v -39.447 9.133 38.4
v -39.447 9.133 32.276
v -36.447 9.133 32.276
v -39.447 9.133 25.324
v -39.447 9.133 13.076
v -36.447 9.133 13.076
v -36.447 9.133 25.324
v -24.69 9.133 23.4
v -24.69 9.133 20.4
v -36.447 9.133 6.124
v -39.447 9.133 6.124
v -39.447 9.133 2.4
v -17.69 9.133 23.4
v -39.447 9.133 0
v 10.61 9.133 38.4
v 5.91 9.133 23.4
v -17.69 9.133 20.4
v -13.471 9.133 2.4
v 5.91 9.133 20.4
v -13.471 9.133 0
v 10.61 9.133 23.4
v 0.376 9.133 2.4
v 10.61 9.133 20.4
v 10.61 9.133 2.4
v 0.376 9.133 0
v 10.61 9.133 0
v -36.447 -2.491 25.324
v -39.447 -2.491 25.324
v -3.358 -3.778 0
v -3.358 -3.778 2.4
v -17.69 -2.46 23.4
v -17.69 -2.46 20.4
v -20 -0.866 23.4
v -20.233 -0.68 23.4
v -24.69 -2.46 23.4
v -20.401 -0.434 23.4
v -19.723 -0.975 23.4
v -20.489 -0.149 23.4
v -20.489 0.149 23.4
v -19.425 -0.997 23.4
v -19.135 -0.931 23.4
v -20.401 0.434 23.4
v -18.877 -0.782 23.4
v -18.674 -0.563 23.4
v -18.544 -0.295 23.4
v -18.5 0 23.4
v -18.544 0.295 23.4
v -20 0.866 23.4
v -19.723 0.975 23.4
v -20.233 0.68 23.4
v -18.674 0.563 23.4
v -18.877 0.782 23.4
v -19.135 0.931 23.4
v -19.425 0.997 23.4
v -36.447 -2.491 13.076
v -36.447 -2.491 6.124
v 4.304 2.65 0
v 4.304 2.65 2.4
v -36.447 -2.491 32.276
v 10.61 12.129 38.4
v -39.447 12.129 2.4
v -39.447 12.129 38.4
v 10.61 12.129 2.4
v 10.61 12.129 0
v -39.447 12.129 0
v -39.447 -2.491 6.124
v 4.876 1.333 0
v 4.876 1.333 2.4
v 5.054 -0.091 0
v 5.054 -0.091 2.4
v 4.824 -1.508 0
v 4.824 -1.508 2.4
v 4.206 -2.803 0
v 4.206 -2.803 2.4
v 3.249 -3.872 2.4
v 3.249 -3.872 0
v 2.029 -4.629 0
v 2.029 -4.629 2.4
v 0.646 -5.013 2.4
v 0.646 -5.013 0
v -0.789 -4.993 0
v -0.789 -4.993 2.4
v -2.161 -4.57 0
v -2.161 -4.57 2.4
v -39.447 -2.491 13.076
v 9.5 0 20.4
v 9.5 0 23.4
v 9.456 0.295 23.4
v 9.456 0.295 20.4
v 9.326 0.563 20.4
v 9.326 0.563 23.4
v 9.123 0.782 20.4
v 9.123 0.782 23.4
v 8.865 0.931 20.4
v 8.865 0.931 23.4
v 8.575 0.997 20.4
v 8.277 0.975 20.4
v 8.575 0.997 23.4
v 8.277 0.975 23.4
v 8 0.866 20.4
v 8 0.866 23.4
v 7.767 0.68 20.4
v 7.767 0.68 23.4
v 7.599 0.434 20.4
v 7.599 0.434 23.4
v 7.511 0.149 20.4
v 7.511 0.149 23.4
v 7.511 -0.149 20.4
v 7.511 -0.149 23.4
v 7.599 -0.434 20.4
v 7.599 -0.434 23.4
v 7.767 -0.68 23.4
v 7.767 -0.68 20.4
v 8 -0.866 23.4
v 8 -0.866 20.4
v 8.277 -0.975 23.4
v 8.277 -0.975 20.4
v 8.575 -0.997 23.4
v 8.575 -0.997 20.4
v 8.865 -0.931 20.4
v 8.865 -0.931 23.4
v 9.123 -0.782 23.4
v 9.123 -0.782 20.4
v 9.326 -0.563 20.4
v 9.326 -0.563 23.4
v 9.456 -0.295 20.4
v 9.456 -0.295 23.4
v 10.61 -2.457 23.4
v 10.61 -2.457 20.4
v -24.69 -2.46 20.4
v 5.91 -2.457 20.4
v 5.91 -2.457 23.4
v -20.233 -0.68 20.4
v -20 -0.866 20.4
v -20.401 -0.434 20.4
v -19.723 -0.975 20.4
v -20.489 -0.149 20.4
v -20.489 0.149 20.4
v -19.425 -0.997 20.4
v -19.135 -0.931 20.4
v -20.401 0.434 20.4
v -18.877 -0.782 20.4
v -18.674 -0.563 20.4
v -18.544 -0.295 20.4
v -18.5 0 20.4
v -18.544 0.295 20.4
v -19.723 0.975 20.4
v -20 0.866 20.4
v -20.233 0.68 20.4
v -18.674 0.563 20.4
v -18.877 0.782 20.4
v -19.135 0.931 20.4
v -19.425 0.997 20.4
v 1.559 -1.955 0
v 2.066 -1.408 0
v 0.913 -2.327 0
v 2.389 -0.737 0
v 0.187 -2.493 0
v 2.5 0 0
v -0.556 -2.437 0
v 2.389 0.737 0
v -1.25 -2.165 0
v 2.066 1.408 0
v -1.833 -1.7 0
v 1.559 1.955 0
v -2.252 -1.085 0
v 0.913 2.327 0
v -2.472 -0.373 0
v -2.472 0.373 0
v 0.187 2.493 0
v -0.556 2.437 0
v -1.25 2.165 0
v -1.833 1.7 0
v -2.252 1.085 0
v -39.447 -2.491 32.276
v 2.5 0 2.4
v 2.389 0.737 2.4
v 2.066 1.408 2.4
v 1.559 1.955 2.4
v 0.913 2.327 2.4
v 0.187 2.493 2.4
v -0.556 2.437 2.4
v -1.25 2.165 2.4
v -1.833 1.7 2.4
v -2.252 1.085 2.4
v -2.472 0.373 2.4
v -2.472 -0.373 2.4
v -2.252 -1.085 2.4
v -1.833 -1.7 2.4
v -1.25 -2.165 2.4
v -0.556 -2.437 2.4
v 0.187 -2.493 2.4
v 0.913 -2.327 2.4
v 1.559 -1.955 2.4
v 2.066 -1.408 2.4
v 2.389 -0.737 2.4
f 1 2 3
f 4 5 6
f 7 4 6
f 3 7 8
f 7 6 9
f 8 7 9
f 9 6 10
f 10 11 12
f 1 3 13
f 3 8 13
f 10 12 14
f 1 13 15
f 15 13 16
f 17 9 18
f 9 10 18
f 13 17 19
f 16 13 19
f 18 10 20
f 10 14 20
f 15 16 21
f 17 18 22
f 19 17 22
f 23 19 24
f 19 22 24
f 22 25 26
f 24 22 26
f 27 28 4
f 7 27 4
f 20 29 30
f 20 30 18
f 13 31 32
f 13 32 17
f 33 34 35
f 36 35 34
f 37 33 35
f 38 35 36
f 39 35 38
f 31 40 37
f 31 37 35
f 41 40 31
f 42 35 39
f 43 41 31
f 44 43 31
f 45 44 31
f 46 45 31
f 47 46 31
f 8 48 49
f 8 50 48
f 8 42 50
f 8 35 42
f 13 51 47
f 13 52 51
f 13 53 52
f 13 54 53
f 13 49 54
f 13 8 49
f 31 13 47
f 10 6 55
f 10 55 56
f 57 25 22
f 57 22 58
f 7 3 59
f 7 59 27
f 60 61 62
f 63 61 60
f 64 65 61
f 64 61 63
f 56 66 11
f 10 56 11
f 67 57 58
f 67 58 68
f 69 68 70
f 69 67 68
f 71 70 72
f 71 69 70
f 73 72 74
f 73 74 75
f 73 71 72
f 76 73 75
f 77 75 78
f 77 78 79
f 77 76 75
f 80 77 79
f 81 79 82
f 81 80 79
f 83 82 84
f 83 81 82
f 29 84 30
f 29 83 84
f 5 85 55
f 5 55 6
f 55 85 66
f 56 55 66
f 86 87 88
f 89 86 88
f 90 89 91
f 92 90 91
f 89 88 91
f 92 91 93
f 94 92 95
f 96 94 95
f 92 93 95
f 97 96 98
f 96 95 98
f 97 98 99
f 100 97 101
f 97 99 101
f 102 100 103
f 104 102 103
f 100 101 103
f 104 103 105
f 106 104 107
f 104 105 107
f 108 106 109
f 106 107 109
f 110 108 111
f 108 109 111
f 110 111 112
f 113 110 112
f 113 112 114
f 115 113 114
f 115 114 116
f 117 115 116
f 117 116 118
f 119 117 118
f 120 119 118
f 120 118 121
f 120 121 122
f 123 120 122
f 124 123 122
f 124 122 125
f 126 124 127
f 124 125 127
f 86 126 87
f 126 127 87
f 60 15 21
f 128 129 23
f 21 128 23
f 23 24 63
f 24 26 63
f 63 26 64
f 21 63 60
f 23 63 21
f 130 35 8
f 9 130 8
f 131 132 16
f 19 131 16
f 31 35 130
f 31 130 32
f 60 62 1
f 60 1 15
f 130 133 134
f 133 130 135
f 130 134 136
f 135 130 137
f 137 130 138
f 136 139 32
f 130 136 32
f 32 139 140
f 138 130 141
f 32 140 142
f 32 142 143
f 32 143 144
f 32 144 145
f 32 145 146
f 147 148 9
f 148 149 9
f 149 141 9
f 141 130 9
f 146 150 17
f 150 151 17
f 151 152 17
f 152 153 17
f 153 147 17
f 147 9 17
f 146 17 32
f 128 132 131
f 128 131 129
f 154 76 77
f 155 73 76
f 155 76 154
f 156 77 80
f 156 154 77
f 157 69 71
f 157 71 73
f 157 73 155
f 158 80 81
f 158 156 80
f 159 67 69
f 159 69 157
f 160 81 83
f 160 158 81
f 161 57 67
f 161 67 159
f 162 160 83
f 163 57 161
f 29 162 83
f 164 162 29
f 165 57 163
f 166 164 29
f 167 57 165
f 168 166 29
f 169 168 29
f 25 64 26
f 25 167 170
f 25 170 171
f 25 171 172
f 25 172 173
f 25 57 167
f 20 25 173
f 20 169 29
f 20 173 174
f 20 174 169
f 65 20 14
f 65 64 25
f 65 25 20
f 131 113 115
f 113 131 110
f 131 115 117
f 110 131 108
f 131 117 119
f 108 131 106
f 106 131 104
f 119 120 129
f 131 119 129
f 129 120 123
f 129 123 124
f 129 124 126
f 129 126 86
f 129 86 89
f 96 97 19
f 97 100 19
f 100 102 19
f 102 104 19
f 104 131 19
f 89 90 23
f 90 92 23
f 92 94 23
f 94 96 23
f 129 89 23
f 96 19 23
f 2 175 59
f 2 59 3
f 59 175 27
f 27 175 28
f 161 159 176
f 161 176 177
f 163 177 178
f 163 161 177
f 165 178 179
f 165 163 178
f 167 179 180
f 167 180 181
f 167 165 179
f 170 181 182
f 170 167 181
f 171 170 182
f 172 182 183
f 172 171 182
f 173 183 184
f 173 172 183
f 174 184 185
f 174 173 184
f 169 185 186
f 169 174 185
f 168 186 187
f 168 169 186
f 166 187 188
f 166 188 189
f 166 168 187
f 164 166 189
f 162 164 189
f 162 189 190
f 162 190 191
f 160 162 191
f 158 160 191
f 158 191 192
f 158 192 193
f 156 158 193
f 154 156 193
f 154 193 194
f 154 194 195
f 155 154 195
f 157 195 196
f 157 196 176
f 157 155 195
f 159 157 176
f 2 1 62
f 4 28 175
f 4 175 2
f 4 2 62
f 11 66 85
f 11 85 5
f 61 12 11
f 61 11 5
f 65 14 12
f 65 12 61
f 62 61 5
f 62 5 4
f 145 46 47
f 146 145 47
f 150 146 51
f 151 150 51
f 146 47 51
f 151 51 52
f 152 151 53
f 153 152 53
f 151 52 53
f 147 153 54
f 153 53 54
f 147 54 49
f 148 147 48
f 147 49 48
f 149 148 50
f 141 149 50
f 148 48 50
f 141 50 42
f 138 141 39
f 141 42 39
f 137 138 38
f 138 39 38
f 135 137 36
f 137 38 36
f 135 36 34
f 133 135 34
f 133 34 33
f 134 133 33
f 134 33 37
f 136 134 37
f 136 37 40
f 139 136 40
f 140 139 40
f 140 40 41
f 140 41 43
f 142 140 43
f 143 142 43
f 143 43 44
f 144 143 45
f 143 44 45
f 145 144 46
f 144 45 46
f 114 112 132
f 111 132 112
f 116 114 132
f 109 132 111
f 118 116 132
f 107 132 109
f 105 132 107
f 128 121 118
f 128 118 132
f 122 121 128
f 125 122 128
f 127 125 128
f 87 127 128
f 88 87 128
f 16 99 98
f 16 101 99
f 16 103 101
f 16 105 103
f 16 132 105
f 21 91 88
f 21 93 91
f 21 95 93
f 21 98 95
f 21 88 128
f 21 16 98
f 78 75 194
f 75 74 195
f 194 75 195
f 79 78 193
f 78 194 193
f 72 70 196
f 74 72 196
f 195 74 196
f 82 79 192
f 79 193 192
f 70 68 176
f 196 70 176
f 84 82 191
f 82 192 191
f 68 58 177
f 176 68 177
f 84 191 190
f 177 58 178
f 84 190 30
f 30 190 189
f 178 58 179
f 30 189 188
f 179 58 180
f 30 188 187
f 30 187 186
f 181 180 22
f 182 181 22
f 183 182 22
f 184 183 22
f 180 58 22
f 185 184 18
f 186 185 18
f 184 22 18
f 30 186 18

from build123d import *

# Parameters (mm, degrees)
ESQUISSE1_R        = 2.5
BOSS_EXTRU_1_DEPTH = 2.4
ESQUISSE4_W        = 50.056999207
ESQUISSE4_H        = 2.995999995
BOSS_EXTRU_2_DEPTH = 36
BOSS_EXTRU_3_START = -15
ESQUISSE5_W        = 4.7
ESQUISSE5_H        = 11.59
ESQUISSE5_R        = 1
ESQUISSE5_W_2      = 7
ESQUISSE5_H_2      = 11.59300438
BOSS_EXTRU_3_DEPTH = 3
ESQUISSE6_W        = 6.951967
ESQUISSE6_H        = 11.62400213
BOSS_EXTRU_4_DEPTH = 3


with BuildPart() as part:
    # Esquisse1 → Boss.-Extru.1 (new body)
    with BuildSketch(Plane.XY):
        with BuildLine():
            Line((-39.447248325, 12.128903773), (10.609750882, 12.128903773))
            Line((10.609750882, 12.128903773), (10.609750882, 9.132903778))
            Line((10.609750882, 9.132903778), (0.375600944, 9.132903778))
            Line((0.375600944, 9.132903778), (4.304312905, 2.649911034))
            ThreePointArc((4.304312905, 2.649911034), (3.248571469, -3.872456776), (-3.358011614, -3.777948659))
            Line((-3.358011614, -3.777948659), (-13.470694005, 9.132903778))
            Line((-13.470694005, 9.132903778), (-39.447248325, 9.132903778))
            Line((-39.447248325, 9.132903778), (-39.447248325, 12.128903773))
        make_face()
        Circle(ESQUISSE1_R, mode=Mode.SUBTRACT)
    extrude(amount=BOSS_EXTRU_1_DEPTH)

    # Esquisse4 → Boss.-Extru.2 (add)
    with BuildSketch(Plane.XY.offset(2.4)):
        with Locations((-14.418748722, 10.630903776)):
            Rectangle(ESQUISSE4_W, ESQUISSE4_H)
    extrude(amount=BOSS_EXTRU_2_DEPTH)

    # Esquisse5 → Boss.-Extru.3 (add)
    # profile 1 of 2: a face of its own
    with BuildSketch(Plane.XY.offset(38.4).offset(BOSS_EXTRU_3_START)):
        with Locations((8.259750882, 3.337903778)):
            Rectangle(ESQUISSE5_W, ESQUISSE5_H)
        with Locations((8.5, 0)):
            Circle(ESQUISSE5_R, mode=Mode.SUBTRACT)
    # profile 2 of 2: a face of its own
    with BuildSketch(Plane.XY.offset(38.4).offset(BOSS_EXTRU_3_START)):
        with Locations((-21.190248118, 3.336401588)):
            Rectangle(ESQUISSE5_W_2, ESQUISSE5_H_2)
        with Locations((-19.5, 0)):
            Circle(ESQUISSE5_R, mode=Mode.SUBTRACT)
    extrude(amount=-BOSS_EXTRU_3_DEPTH)

    # Esquisse6 → Boss.-Extru.4 (add)
    with BuildSketch(Plane(origin=(-39.447248325, 0, -39.447248325), x_dir=(0, 0, -1), z_dir=(1, 0, 0))):
        with Locations((-49.047247825, 3.320902713)):
            Rectangle(ESQUISSE6_W, ESQUISSE6_H)
        with Locations((-68.247248825, 3.320902713)):
            Rectangle(ESQUISSE6_W, ESQUISSE6_H)
    extrude(amount=BOSS_EXTRU_4_DEPTH)


solid = part.part
